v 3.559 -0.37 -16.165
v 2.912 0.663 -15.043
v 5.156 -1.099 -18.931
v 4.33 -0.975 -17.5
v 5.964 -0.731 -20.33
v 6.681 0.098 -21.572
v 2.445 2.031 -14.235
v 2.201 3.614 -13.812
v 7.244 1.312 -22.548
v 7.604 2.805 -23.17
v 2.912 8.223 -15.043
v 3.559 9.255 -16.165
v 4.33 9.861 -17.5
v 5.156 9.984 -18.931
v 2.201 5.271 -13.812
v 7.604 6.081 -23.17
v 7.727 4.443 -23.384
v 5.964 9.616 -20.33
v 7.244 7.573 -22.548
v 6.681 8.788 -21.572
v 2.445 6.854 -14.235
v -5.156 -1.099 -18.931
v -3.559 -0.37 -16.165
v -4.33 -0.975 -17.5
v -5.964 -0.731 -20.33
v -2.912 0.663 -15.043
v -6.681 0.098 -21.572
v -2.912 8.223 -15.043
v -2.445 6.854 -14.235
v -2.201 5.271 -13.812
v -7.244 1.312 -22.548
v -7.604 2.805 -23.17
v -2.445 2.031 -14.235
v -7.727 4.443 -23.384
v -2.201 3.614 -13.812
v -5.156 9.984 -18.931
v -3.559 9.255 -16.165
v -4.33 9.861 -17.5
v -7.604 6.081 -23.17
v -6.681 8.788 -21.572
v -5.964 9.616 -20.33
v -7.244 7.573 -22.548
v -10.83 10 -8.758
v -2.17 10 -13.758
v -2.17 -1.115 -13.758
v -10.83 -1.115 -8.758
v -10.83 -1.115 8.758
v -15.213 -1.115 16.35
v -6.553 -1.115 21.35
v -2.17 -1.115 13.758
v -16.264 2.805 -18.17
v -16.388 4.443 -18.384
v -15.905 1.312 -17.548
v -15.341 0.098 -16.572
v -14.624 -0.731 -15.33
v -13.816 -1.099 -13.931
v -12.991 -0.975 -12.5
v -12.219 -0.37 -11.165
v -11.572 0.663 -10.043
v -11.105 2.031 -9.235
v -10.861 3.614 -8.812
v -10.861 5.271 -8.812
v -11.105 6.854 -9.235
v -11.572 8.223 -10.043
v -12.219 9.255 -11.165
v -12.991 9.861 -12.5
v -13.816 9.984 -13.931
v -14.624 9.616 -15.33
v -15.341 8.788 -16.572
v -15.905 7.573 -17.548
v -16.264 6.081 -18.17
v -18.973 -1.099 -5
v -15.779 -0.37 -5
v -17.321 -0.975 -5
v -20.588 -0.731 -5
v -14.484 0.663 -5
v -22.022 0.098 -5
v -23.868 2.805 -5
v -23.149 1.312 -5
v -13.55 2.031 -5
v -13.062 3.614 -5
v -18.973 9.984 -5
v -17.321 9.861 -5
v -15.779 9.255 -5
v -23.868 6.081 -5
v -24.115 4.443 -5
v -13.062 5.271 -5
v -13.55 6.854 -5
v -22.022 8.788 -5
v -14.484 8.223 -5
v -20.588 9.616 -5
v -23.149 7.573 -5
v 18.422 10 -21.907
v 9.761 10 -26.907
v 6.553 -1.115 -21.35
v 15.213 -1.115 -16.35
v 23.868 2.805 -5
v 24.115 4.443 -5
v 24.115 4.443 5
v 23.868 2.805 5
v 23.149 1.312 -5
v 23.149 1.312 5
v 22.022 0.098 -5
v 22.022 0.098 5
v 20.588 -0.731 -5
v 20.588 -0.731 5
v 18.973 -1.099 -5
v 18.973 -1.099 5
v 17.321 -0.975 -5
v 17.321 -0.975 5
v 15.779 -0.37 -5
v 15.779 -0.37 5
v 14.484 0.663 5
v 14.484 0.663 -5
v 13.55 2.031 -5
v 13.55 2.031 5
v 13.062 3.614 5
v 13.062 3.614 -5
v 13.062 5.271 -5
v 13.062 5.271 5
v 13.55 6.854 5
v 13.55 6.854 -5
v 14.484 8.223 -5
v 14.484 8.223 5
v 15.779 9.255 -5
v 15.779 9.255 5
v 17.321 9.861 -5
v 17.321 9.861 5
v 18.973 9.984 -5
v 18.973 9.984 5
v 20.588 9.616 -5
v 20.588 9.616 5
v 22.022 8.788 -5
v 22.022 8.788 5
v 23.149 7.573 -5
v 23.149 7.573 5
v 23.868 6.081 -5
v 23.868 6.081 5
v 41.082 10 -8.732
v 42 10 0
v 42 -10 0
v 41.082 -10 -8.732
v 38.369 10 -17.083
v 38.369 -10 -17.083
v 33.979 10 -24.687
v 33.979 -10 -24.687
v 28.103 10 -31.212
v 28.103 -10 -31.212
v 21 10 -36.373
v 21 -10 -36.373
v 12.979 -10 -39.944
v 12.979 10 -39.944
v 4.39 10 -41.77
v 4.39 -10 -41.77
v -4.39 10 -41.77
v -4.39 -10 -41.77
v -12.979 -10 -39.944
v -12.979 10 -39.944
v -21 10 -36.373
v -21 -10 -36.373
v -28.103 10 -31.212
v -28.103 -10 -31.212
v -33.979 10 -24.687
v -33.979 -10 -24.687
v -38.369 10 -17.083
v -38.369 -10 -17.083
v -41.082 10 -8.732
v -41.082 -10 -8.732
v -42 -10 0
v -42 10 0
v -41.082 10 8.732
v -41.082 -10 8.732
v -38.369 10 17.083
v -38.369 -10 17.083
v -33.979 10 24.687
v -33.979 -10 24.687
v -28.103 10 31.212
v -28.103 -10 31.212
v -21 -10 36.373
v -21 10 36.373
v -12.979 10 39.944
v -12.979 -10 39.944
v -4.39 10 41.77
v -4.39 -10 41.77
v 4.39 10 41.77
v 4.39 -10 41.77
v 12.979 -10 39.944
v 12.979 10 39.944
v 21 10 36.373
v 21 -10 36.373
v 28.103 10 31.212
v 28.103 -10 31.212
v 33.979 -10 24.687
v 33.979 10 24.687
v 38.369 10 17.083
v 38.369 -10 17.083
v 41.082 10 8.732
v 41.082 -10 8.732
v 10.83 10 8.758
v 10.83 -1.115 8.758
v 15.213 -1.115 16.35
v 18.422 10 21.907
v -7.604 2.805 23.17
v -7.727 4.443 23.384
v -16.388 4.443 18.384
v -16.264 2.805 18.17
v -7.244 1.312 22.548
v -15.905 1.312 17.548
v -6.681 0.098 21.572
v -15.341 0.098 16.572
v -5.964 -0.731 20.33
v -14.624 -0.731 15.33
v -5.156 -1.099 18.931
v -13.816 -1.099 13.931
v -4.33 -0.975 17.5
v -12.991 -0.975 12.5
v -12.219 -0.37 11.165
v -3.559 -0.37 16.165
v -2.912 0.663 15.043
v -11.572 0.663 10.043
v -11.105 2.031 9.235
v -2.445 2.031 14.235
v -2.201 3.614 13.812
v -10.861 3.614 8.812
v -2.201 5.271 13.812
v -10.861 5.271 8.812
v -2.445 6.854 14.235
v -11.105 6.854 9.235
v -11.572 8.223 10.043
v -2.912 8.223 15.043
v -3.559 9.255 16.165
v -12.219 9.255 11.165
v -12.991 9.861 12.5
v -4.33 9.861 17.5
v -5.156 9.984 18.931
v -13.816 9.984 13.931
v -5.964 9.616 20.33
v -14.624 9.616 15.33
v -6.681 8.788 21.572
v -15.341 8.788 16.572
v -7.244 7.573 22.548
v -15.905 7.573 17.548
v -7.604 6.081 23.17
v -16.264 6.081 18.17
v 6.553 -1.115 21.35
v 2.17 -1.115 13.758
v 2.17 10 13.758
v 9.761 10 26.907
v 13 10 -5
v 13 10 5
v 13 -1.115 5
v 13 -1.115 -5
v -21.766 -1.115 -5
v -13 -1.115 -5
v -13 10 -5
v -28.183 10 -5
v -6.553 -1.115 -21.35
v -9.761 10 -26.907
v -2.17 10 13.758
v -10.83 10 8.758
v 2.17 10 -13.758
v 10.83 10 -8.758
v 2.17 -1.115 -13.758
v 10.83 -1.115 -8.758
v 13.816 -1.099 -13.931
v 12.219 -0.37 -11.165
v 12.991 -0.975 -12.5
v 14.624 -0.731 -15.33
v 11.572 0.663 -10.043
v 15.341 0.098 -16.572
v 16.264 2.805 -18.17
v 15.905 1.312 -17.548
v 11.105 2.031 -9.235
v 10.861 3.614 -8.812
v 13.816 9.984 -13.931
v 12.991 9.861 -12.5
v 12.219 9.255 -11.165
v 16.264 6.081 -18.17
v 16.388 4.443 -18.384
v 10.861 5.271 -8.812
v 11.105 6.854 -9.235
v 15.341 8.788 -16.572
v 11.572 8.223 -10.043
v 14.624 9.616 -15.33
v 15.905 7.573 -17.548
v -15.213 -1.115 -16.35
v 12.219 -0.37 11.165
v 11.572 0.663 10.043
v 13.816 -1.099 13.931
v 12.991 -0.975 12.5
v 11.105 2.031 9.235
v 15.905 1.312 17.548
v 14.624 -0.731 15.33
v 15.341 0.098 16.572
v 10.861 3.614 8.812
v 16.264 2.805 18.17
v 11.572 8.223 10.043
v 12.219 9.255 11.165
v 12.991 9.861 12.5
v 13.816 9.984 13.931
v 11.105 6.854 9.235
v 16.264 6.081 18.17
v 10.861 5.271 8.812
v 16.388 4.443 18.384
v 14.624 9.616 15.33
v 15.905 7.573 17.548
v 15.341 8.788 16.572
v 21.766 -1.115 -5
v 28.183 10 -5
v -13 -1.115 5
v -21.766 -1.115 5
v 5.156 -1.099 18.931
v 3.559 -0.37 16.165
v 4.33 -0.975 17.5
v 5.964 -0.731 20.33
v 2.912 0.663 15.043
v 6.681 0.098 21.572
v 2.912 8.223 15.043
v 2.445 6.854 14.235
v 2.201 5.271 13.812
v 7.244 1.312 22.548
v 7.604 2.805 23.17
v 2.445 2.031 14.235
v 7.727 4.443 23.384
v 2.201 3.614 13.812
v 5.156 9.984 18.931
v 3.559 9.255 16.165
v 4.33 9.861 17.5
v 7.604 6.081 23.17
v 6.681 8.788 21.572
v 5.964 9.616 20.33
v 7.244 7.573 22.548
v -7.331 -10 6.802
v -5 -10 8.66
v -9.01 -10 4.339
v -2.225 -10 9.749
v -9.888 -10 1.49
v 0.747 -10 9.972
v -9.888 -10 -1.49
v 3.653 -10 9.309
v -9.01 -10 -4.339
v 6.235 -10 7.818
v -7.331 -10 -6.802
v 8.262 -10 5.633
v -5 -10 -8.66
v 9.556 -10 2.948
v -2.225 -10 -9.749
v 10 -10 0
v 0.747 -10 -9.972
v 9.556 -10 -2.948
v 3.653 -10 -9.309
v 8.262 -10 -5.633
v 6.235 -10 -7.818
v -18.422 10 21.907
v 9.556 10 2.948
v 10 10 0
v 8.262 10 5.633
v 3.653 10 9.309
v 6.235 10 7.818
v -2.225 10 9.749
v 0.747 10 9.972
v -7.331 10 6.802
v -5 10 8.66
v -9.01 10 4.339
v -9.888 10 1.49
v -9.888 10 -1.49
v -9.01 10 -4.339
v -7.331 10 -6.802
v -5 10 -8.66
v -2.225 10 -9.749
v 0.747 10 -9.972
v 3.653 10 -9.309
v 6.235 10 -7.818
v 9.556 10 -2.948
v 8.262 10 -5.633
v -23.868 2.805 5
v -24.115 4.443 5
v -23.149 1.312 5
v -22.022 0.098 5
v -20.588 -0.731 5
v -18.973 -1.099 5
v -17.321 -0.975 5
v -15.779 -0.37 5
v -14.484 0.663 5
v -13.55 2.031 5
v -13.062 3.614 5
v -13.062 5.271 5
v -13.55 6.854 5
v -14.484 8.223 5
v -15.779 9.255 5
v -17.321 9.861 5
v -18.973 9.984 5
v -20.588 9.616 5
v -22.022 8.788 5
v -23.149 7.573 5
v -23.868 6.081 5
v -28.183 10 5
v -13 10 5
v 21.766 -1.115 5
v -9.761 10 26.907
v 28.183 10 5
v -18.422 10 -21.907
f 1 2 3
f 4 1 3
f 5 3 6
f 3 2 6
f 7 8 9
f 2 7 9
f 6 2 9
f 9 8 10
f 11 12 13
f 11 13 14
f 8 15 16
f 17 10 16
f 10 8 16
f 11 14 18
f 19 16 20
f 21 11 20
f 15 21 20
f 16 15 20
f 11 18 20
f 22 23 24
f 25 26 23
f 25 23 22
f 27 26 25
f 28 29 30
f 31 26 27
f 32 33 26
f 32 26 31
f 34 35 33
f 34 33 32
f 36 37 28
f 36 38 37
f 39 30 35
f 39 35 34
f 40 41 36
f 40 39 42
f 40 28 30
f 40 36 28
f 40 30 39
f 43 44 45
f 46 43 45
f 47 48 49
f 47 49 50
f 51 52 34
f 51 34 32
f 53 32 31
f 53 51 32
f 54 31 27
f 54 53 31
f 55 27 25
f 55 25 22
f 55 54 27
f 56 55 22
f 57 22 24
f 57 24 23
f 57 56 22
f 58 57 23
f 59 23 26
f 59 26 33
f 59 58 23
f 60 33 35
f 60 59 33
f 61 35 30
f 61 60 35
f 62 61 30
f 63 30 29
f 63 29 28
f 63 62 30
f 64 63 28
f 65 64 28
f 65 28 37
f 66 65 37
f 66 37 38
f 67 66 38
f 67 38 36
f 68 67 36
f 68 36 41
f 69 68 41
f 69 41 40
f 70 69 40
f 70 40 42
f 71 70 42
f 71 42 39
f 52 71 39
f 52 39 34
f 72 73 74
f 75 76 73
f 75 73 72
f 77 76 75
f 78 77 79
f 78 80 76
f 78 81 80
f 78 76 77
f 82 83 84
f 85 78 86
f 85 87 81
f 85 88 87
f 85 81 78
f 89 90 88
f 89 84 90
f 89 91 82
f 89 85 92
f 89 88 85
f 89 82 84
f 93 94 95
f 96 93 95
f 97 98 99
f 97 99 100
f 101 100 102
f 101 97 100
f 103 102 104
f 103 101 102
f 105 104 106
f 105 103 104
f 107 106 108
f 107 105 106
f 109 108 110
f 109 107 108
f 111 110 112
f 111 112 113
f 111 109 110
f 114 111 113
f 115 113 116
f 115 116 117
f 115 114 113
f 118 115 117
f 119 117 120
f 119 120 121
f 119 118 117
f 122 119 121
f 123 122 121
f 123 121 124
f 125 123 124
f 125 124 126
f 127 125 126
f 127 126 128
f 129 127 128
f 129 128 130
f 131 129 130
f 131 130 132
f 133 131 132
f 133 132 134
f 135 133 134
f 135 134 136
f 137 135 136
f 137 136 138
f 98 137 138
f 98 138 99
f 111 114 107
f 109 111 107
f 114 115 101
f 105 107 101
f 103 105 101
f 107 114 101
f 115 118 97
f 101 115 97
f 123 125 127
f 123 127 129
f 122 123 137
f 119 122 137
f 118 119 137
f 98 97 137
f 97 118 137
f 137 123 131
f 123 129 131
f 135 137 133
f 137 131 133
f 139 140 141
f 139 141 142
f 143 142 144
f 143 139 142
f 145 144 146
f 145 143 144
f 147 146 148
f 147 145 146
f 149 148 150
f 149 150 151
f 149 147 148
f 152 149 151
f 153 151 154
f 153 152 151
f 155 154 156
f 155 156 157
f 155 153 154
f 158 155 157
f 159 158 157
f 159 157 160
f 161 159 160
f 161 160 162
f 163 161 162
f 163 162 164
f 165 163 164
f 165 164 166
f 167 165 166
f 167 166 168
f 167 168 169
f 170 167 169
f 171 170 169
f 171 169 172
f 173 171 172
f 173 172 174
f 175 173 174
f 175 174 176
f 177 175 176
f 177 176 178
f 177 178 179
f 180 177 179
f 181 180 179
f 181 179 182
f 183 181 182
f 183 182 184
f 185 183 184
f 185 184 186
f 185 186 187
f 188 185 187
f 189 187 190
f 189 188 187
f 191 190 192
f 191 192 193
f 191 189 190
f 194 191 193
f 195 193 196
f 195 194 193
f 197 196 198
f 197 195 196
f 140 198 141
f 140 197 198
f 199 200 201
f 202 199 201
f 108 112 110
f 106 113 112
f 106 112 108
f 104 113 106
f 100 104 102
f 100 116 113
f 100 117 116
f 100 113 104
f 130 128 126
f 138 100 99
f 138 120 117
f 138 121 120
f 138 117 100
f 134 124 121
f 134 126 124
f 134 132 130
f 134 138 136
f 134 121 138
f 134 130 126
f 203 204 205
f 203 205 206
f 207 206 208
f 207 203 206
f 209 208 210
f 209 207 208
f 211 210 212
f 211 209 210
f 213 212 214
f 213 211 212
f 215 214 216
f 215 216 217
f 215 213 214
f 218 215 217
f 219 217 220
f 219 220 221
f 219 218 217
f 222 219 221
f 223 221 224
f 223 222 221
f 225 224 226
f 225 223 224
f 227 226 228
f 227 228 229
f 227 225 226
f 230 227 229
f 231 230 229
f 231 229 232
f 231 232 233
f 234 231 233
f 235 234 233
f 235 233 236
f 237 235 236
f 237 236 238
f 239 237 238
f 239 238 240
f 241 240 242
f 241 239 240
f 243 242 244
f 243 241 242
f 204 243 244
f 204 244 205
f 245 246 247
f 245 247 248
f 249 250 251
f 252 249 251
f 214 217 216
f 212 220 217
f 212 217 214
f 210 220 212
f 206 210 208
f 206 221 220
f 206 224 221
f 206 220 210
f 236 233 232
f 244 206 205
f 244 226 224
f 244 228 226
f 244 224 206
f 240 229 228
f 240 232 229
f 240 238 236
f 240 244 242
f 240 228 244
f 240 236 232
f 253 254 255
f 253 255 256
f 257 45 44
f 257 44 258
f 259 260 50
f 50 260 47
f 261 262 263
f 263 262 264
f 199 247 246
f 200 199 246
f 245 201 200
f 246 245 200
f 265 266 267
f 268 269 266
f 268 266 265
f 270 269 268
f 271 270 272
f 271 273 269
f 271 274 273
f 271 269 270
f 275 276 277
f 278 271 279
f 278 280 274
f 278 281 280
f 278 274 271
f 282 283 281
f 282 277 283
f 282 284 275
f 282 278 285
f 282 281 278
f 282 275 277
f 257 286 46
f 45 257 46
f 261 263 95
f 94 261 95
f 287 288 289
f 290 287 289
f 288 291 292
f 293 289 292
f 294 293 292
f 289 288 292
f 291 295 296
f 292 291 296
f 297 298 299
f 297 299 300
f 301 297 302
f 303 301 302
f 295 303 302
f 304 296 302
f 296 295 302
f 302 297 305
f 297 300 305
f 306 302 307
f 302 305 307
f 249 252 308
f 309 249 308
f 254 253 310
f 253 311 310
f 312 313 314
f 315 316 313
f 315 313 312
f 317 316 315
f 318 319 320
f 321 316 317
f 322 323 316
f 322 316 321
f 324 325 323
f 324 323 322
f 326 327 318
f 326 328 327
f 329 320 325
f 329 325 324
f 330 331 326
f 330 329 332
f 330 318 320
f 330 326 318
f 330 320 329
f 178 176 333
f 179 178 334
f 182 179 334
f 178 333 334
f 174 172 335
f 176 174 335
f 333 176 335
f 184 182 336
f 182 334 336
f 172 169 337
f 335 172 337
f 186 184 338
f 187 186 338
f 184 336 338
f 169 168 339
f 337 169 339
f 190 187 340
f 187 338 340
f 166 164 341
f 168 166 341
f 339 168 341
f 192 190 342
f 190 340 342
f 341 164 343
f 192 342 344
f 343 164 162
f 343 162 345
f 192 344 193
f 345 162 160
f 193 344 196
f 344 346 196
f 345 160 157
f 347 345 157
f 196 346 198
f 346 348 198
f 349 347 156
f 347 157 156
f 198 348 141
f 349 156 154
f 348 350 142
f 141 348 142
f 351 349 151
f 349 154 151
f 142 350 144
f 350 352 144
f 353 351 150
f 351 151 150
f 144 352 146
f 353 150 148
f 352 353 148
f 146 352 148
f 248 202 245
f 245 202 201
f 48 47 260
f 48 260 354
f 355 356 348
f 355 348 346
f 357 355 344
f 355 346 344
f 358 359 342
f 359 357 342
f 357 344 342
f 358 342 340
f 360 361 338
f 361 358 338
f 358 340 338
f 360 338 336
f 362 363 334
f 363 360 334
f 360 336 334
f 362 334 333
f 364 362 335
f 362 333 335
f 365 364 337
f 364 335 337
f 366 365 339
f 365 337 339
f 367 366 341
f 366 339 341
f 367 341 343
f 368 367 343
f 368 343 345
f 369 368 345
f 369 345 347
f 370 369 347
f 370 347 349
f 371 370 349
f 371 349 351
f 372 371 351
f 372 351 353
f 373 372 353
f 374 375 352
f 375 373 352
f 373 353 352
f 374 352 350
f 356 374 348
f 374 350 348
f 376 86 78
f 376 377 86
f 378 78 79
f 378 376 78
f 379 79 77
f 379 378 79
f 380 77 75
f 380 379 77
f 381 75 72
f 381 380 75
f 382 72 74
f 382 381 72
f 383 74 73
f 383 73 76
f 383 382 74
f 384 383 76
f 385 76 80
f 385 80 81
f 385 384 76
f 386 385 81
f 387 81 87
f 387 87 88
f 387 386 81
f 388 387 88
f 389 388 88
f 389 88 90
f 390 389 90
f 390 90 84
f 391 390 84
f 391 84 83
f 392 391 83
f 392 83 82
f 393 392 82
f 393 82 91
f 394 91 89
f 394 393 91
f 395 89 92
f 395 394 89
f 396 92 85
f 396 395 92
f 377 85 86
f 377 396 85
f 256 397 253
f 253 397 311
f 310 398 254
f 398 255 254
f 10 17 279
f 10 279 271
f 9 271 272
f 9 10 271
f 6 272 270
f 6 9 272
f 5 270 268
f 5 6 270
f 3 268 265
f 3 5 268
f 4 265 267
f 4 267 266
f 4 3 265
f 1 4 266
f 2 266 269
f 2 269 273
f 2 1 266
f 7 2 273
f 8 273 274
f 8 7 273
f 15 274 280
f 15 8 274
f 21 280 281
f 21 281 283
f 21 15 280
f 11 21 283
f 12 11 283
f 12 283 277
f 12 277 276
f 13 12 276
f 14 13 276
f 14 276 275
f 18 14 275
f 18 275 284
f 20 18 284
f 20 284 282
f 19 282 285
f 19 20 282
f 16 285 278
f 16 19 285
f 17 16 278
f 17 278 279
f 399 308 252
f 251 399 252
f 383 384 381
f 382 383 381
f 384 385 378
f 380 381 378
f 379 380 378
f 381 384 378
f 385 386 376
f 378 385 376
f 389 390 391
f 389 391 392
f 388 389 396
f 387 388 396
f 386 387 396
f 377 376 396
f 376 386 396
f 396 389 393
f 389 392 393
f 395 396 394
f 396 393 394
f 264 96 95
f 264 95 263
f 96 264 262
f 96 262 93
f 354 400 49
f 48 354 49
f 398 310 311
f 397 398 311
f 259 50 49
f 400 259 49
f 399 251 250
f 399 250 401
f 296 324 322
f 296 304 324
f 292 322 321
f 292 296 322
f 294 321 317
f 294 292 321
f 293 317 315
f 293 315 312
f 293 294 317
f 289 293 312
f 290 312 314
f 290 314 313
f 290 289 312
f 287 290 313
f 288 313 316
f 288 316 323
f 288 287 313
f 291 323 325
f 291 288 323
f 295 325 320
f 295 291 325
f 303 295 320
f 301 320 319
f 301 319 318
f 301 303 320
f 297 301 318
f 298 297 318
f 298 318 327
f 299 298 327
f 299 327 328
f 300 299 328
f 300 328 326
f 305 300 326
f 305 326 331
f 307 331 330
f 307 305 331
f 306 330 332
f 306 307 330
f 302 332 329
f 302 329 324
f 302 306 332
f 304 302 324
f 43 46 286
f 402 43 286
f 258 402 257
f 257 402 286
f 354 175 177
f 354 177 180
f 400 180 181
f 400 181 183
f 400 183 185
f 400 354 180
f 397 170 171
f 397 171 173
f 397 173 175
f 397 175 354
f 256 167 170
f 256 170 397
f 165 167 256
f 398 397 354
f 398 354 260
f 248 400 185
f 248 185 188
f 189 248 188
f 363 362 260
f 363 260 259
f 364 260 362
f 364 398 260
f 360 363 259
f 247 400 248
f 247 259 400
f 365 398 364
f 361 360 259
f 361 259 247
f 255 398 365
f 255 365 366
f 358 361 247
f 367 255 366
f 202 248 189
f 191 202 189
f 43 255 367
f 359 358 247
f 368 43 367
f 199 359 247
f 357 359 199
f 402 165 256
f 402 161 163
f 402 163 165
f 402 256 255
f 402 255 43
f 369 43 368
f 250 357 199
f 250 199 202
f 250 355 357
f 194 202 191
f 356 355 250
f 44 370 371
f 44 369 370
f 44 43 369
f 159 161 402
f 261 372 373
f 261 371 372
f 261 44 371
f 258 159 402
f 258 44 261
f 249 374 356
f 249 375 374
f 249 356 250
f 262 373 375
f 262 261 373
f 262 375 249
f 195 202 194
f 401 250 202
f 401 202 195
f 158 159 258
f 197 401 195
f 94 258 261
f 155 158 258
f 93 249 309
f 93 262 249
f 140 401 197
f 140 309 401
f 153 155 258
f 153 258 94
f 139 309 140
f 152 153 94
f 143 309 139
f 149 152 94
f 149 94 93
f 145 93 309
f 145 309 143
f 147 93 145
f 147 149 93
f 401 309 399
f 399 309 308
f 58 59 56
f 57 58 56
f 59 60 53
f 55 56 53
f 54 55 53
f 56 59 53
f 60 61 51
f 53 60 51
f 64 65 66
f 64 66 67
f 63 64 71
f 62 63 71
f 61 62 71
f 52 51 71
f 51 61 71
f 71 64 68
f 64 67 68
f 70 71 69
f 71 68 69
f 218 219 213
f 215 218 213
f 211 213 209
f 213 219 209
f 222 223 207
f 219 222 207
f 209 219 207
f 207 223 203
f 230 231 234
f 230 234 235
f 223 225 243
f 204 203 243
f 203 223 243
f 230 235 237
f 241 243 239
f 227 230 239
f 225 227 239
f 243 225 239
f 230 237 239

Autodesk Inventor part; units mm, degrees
ref_plane "YZ Plane" through (0, 0, 0) normal (1, 0, 0) x (0, 1, 0)
ref_plane "XZ Plane" through (0, 0, 0) normal (0, 1, 0) x (-1, 0, 0)
ref_plane "XY Plane" through (0, 0, 0) normal (0, 0, 1) x (1, 0, 0)
sketch "草圖1" plane through (0, 0, 0) normal (0, 0, 1) x (1, 0, 0)
  line L0 (0, -12.1345) -> (0, 12.1345)
  line L1 (10, -10) -> (42, -10)
  line L2 (42, -10) -> (42, 10)
  line L3 (42, 10) -> (10, 10)
  line L4 (10, 10) -> (10, -10)
  line L5 (-15.5263, 0) -> (15.5263, 0)
  point P0 (0, 0)
  point P1 (0, 0)
  point P2 (10, 0)
  dimension "d0" = 20
  dimension "d1" = 20
  dimension "d2" = 84
revolve "迴轉1" add sketch "草圖1" angle 360 about axis through (0, -12.1345, 0) along (0, 1, 0)
sketch "草圖3" plane through (0, 0, 0) normal (0, 0, 1) x (1, 0, 0)
  line L0 (42, 10) -> (10, 10) projected
  line L1 (-15.5263, 0) -> (15.5263, 0) projected
  circle A0 centre (18.5574, 4.4426) radius 5.5574
  line L2 (28.183, 10) -> (21.7659, -1.1147)
  line L3 (21.7659, -1.1147) -> (13, -1.1147)
  line L4 (10, 10) -> (10, -10) projected
  line L5 (13, 10) -> (13, -1.1147)
  point P0 (0, 0)
  dimension "d5" = 60
  dimension "d6" = 3
extrude "擠出1" cut sketch "草圖3" along normal mid plane 10 contours L0 A0 L5 | L0 L2 A0 | A0 | A0 L1 L5 | A0 L3 L5 L1 | L2 L3 A0
pattern_circular "環形陣列1" count 6 over 360 about axis through (0, -10, 0) along (0, 1, 0) of "擠出1"
sketch "草圖4" plane through (0, 10, 0) normal (0, 1, 0) x (1, 0, 0)
  line L0 (0, 12.7017) -> (11, 6.3509)
  line L1 (11, 6.3509) -> (11, -6.3509)
  line L2 (11, -6.3509) -> (0, -12.7017)
  line L3 (0, -12.7017) -> (-11, -6.3509)
  line L4 (-11, -6.3509) -> (-11, 6.3509)
  line L5 (-11, 6.3509) -> (0, 12.7017)
  line L6 (13, -5) -> (13, 5) projected
  point P0 (0, 0)
  point P1 (0, 0)
  dimension "d12" = 11
  dimension "d13" = 2
extrude "擠出2" add sketch "草圖3" along normal mid plane 10 separate body contours A0
pattern_circular "環形陣列2" count 6 over 360 about axis through (0, -10, 0) along (0, 1, 0) of "擠出2" bodies 2
properties part number "self-regulating"
